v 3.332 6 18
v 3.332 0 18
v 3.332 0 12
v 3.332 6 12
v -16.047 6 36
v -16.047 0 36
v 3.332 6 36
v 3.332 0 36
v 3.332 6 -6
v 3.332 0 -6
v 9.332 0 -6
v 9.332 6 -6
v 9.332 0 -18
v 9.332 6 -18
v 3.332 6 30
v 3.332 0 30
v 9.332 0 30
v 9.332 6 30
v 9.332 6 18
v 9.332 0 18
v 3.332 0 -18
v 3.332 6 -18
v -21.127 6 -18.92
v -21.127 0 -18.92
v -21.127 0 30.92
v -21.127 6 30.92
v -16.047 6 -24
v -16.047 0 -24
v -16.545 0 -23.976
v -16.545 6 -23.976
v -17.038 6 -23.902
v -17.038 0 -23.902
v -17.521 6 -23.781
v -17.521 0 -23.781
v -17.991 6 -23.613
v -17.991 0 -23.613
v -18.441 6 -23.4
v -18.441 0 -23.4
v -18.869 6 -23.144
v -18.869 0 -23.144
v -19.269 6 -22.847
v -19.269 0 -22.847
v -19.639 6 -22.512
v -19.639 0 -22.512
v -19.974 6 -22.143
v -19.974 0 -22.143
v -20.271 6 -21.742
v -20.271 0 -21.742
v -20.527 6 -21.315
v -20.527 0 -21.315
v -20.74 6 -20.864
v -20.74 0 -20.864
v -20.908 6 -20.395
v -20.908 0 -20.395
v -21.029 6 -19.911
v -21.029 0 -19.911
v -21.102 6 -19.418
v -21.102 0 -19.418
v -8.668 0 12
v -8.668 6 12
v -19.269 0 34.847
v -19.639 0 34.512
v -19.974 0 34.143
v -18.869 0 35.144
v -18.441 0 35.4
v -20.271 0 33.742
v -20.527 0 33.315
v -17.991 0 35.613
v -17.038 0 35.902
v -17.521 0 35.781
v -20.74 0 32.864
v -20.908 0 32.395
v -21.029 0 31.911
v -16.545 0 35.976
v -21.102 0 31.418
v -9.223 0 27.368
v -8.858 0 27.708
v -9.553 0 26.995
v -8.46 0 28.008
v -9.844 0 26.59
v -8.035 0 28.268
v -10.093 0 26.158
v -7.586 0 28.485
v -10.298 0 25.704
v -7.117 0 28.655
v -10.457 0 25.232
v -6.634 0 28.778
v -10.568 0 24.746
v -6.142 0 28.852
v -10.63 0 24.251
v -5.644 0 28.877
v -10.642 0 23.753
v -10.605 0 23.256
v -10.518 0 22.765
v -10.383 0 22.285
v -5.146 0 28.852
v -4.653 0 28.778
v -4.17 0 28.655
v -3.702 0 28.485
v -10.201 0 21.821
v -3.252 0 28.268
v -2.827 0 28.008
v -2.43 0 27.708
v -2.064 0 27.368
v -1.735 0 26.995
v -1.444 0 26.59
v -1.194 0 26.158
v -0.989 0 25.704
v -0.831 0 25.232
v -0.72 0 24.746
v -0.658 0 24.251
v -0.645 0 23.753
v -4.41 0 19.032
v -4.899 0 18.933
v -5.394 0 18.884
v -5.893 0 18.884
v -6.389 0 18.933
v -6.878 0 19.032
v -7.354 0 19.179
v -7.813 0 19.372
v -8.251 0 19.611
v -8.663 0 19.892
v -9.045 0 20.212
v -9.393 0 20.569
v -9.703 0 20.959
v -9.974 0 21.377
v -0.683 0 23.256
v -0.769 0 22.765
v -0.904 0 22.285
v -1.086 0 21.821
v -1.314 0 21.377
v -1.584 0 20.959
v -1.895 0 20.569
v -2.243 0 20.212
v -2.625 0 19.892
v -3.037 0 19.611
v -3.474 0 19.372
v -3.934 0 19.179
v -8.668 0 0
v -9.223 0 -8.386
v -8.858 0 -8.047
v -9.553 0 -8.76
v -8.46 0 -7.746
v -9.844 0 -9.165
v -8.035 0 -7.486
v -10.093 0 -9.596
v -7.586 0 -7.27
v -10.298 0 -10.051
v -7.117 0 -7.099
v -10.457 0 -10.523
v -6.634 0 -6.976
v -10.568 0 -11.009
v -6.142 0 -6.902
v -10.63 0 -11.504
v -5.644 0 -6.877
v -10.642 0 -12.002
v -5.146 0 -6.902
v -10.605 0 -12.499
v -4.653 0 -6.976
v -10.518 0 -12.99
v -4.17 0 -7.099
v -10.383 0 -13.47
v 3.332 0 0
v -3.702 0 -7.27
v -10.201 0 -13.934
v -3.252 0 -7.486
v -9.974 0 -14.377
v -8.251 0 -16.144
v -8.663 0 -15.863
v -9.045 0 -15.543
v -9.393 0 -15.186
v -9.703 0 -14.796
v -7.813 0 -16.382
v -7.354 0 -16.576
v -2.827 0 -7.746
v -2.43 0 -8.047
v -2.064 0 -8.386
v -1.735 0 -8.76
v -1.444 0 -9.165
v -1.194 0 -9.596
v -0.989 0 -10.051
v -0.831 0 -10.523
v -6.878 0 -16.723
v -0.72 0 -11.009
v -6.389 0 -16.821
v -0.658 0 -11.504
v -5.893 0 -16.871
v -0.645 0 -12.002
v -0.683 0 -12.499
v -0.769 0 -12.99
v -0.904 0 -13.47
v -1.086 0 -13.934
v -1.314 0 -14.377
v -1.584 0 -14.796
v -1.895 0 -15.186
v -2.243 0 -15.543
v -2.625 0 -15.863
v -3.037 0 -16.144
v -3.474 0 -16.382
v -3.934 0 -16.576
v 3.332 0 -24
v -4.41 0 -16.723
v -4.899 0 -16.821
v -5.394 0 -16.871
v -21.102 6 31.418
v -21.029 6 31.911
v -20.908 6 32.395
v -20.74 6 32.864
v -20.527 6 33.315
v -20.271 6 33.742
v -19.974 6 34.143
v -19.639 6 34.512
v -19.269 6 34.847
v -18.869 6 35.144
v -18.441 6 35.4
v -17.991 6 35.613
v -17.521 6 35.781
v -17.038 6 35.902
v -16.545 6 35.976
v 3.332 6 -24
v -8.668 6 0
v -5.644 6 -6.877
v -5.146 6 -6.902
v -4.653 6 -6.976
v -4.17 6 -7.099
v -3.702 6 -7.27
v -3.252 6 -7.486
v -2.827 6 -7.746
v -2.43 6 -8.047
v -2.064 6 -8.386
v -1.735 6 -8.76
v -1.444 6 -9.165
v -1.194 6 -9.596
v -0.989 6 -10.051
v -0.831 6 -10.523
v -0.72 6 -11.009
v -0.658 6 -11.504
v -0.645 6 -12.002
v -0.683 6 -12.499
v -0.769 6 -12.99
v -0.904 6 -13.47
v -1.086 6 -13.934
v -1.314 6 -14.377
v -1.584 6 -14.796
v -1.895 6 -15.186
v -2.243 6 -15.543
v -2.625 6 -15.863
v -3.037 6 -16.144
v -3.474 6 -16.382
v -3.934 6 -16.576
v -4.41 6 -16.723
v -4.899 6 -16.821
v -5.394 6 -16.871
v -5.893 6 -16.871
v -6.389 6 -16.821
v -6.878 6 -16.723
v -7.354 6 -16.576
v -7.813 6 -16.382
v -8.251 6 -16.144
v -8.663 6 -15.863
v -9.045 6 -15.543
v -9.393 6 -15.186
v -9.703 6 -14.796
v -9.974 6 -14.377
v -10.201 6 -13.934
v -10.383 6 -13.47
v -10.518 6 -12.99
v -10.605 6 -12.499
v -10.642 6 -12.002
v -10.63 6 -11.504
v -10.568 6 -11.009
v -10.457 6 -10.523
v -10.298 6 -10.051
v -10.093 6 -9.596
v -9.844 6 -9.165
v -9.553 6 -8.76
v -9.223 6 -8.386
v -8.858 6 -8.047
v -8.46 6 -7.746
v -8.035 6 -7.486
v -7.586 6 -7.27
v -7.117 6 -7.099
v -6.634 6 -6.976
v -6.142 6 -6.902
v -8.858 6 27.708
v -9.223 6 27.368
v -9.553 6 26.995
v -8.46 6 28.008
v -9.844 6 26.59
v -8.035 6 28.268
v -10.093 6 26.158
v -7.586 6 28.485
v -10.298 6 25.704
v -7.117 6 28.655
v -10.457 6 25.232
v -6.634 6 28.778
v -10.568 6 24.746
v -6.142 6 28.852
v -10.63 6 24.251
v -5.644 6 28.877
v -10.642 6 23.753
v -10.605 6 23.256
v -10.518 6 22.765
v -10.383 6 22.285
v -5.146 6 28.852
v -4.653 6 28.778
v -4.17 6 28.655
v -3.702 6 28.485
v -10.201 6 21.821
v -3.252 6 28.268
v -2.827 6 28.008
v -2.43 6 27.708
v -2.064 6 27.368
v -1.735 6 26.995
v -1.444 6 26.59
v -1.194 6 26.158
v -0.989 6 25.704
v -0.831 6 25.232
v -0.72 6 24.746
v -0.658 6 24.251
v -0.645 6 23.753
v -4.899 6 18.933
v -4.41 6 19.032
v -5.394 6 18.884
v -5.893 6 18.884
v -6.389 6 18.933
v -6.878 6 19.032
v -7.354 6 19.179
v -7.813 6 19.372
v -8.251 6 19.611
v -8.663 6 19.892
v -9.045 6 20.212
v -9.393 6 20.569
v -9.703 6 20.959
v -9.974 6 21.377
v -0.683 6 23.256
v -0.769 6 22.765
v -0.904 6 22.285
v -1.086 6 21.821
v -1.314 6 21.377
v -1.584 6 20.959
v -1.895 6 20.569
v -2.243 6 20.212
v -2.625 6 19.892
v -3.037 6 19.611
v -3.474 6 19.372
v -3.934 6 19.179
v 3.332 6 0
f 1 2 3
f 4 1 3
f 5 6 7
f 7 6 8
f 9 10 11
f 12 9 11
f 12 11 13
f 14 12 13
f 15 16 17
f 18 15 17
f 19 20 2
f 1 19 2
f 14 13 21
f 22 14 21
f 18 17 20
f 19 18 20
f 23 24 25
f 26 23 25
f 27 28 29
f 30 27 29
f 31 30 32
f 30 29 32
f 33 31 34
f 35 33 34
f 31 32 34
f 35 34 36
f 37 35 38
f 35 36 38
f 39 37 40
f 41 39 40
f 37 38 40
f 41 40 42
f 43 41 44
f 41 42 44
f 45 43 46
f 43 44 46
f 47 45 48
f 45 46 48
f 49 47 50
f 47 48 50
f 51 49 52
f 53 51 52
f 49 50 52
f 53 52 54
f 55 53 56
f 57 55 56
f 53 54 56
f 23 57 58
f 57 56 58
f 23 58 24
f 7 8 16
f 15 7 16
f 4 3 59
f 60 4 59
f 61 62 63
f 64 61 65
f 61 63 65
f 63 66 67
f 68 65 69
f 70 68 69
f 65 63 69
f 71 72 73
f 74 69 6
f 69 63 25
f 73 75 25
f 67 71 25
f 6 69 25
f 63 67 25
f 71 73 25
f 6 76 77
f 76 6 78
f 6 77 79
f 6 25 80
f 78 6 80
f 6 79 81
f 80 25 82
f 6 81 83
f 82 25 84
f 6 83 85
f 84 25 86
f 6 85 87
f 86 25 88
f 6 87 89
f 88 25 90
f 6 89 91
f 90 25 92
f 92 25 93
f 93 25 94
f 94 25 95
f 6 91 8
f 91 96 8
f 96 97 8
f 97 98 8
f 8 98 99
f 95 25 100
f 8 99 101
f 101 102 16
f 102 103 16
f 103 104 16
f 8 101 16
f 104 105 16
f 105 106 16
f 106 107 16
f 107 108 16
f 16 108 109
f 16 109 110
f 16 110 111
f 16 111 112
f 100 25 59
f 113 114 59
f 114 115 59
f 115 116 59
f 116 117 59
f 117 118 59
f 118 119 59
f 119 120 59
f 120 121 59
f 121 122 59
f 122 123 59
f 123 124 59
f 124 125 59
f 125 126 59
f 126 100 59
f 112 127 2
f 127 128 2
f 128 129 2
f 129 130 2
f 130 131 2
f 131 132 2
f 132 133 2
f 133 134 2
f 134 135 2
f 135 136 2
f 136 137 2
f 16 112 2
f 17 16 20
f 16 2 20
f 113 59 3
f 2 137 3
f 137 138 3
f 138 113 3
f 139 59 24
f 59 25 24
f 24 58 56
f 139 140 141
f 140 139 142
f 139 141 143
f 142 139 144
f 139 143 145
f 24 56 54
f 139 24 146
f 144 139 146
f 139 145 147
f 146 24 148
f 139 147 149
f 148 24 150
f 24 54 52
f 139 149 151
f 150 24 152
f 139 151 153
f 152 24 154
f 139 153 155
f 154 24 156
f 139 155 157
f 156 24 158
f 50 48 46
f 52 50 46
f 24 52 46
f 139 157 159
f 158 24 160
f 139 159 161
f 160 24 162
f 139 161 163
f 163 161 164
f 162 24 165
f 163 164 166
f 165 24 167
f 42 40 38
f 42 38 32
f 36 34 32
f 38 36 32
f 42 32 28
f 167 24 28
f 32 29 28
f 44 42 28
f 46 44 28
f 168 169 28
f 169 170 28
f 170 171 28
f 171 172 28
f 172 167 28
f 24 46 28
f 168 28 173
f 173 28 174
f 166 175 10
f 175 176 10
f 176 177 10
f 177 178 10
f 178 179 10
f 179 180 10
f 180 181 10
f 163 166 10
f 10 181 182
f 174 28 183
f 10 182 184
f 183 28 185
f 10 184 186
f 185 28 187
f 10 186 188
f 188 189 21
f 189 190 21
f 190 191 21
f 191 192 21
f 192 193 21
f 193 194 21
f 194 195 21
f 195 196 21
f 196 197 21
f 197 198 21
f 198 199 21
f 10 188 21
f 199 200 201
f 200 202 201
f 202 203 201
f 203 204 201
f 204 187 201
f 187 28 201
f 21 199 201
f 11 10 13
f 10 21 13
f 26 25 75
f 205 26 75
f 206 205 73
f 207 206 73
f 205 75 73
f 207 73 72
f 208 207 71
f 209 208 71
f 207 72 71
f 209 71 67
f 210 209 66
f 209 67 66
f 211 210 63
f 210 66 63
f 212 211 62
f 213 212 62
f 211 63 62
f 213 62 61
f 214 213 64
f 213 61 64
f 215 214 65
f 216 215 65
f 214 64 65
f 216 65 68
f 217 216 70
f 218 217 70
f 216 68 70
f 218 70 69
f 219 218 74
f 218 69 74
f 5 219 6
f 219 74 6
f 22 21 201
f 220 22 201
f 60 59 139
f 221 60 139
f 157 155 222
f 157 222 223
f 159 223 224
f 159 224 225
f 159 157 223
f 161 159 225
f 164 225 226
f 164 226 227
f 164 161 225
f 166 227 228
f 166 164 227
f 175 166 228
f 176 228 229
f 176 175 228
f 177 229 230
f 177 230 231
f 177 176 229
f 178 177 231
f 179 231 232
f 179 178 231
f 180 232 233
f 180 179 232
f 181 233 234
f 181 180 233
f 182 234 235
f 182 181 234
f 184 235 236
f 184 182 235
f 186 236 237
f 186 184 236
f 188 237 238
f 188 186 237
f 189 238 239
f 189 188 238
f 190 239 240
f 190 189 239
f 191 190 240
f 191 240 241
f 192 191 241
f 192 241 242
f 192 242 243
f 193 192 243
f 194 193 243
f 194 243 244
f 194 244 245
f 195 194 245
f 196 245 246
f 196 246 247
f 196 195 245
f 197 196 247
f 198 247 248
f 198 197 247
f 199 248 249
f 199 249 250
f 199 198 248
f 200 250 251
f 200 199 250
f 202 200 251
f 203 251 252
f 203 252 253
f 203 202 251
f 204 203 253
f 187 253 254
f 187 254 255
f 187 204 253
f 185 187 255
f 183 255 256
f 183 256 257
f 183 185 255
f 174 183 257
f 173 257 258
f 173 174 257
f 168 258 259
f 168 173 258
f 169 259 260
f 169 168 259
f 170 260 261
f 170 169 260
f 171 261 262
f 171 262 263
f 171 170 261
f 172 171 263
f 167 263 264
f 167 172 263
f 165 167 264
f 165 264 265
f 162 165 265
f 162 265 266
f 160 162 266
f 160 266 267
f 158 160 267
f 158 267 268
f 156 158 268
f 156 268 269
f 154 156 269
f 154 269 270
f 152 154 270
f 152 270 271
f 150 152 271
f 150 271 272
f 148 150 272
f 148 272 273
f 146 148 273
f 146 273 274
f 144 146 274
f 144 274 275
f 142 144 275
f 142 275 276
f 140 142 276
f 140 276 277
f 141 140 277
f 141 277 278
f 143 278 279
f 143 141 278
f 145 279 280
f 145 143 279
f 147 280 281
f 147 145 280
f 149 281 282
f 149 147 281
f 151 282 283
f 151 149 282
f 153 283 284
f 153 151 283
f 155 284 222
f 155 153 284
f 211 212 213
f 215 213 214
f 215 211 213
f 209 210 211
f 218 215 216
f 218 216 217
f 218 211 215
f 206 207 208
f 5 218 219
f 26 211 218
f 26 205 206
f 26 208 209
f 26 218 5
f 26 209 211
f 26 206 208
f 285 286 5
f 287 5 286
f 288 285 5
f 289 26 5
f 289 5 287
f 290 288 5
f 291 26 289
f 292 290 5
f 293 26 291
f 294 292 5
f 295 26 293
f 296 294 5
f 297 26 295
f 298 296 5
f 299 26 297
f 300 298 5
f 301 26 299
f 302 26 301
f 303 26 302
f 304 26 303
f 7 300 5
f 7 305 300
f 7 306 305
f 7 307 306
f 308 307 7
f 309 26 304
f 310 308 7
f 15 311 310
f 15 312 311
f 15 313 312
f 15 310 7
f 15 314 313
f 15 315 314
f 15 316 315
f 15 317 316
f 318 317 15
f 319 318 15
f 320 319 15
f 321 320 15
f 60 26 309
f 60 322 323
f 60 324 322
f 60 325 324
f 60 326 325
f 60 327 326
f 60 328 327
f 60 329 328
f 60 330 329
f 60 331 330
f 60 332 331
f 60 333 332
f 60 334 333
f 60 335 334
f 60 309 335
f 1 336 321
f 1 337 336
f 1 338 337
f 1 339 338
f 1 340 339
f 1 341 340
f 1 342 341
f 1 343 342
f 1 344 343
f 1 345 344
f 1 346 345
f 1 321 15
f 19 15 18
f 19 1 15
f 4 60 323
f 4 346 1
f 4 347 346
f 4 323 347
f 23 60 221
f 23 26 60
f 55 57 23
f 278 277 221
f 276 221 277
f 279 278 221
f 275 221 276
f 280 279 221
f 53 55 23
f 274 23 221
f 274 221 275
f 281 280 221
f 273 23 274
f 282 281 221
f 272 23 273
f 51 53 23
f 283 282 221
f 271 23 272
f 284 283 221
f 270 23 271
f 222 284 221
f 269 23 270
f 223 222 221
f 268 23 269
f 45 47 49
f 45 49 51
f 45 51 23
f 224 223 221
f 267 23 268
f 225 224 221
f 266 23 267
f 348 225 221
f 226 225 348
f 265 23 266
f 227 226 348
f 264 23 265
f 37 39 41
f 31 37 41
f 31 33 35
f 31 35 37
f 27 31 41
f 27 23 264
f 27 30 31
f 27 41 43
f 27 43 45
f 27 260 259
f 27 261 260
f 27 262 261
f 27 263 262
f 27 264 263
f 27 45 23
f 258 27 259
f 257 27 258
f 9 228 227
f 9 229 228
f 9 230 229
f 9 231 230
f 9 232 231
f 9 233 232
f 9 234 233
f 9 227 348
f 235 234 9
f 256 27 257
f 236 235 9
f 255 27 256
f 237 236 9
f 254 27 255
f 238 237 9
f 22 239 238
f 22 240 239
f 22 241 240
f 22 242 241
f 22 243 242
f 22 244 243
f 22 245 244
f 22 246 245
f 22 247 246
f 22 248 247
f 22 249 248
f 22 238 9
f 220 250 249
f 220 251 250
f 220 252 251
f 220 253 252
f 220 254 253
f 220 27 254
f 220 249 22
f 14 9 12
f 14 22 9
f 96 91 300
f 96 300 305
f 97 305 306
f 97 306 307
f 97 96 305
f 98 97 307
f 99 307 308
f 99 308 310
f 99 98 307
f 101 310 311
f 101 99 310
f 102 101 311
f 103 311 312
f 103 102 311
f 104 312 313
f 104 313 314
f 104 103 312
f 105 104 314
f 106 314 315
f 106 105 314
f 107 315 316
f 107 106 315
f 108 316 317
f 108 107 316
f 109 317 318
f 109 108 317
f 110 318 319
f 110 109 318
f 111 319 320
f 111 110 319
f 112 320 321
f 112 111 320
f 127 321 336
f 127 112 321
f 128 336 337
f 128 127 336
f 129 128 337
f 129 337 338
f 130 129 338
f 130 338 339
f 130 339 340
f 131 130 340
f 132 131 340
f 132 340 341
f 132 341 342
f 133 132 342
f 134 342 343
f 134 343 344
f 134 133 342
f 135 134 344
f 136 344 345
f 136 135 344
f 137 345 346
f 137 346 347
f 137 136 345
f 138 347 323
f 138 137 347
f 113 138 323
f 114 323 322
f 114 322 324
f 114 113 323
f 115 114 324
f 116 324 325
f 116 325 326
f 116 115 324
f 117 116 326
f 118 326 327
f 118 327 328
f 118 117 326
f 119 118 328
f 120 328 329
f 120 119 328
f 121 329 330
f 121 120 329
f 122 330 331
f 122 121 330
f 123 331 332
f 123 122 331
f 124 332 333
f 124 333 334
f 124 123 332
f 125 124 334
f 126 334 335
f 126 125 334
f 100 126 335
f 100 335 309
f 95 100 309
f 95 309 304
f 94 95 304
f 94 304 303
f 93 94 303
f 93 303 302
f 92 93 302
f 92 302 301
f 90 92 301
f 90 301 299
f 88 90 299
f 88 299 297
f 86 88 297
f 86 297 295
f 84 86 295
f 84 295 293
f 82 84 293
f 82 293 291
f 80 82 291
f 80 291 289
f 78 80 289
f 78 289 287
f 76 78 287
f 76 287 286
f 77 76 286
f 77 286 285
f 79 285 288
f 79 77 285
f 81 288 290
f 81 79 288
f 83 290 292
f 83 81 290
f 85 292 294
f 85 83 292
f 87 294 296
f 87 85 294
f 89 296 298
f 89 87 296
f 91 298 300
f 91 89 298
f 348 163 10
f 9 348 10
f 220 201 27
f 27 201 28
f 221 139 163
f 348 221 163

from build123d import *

# Parameters (mm, degrees)
SKETCH1_R           = 5
BOSS_EXTRUDE1_DEPTH = 6


with BuildPart() as part:
    # Sketch1 → Boss-Extrude1 (new body)
    with BuildSketch(Plane(origin=(0, 0, 0), x_dir=(1, 0, 0), z_dir=(0, 1, 0))):
        with BuildLine():
            Line((-21.126722314, 18.92), (-21.126722314, -30.92))
            ThreePointArc((-21.126722314, -30.92), (-19.638824763, -34.512102448), (-16.046722314, -36))
            Line((-16.046722314, -36), (3.332223015, -36))
            Line((3.332223015, -36), (3.332223015, -30))
            Line((3.332223015, -30), (9.332223015, -30))
            Line((9.332223015, -30), (9.332223015, -18))
            Line((9.332223015, -18), (3.332223015, -18))
            Line((3.332223015, -18), (3.332223015, -12))
            Line((3.332223015, -12), (-8.667776985, -12))
            Line((-8.667776985, -12), (-8.667776985, 0))
            Line((-8.667776985, 0), (3.332223015, 0))
            Line((3.332223015, 0), (3.332223015, 6))
            Line((3.332223015, 6), (9.332223015, 6))
            Line((9.332223015, 6), (9.332223015, 18))
            Line((9.332223015, 18), (3.332223015, 18))
            Line((3.332223015, 18), (3.332223015, 24))
            Line((3.332223015, 24), (-16.046722314, 24))
            ThreePointArc((-16.046722314, 24), (-19.638824763, 22.512102448), (-21.126722314, 18.92))
        make_face()
        with Locations(Location((-5.643722664, 11.877299035, 0), (0, 0, 270))):
            Circle(SKETCH1_R, mode=Mode.SUBTRACT)
        with Locations(Location((-5.643722664, -23.877299035, 0), (0, 0, 270))):
            Circle(SKETCH1_R, mode=Mode.SUBTRACT)
    extrude(amount=BOSS_EXTRUDE1_DEPTH)


solid = part.part
